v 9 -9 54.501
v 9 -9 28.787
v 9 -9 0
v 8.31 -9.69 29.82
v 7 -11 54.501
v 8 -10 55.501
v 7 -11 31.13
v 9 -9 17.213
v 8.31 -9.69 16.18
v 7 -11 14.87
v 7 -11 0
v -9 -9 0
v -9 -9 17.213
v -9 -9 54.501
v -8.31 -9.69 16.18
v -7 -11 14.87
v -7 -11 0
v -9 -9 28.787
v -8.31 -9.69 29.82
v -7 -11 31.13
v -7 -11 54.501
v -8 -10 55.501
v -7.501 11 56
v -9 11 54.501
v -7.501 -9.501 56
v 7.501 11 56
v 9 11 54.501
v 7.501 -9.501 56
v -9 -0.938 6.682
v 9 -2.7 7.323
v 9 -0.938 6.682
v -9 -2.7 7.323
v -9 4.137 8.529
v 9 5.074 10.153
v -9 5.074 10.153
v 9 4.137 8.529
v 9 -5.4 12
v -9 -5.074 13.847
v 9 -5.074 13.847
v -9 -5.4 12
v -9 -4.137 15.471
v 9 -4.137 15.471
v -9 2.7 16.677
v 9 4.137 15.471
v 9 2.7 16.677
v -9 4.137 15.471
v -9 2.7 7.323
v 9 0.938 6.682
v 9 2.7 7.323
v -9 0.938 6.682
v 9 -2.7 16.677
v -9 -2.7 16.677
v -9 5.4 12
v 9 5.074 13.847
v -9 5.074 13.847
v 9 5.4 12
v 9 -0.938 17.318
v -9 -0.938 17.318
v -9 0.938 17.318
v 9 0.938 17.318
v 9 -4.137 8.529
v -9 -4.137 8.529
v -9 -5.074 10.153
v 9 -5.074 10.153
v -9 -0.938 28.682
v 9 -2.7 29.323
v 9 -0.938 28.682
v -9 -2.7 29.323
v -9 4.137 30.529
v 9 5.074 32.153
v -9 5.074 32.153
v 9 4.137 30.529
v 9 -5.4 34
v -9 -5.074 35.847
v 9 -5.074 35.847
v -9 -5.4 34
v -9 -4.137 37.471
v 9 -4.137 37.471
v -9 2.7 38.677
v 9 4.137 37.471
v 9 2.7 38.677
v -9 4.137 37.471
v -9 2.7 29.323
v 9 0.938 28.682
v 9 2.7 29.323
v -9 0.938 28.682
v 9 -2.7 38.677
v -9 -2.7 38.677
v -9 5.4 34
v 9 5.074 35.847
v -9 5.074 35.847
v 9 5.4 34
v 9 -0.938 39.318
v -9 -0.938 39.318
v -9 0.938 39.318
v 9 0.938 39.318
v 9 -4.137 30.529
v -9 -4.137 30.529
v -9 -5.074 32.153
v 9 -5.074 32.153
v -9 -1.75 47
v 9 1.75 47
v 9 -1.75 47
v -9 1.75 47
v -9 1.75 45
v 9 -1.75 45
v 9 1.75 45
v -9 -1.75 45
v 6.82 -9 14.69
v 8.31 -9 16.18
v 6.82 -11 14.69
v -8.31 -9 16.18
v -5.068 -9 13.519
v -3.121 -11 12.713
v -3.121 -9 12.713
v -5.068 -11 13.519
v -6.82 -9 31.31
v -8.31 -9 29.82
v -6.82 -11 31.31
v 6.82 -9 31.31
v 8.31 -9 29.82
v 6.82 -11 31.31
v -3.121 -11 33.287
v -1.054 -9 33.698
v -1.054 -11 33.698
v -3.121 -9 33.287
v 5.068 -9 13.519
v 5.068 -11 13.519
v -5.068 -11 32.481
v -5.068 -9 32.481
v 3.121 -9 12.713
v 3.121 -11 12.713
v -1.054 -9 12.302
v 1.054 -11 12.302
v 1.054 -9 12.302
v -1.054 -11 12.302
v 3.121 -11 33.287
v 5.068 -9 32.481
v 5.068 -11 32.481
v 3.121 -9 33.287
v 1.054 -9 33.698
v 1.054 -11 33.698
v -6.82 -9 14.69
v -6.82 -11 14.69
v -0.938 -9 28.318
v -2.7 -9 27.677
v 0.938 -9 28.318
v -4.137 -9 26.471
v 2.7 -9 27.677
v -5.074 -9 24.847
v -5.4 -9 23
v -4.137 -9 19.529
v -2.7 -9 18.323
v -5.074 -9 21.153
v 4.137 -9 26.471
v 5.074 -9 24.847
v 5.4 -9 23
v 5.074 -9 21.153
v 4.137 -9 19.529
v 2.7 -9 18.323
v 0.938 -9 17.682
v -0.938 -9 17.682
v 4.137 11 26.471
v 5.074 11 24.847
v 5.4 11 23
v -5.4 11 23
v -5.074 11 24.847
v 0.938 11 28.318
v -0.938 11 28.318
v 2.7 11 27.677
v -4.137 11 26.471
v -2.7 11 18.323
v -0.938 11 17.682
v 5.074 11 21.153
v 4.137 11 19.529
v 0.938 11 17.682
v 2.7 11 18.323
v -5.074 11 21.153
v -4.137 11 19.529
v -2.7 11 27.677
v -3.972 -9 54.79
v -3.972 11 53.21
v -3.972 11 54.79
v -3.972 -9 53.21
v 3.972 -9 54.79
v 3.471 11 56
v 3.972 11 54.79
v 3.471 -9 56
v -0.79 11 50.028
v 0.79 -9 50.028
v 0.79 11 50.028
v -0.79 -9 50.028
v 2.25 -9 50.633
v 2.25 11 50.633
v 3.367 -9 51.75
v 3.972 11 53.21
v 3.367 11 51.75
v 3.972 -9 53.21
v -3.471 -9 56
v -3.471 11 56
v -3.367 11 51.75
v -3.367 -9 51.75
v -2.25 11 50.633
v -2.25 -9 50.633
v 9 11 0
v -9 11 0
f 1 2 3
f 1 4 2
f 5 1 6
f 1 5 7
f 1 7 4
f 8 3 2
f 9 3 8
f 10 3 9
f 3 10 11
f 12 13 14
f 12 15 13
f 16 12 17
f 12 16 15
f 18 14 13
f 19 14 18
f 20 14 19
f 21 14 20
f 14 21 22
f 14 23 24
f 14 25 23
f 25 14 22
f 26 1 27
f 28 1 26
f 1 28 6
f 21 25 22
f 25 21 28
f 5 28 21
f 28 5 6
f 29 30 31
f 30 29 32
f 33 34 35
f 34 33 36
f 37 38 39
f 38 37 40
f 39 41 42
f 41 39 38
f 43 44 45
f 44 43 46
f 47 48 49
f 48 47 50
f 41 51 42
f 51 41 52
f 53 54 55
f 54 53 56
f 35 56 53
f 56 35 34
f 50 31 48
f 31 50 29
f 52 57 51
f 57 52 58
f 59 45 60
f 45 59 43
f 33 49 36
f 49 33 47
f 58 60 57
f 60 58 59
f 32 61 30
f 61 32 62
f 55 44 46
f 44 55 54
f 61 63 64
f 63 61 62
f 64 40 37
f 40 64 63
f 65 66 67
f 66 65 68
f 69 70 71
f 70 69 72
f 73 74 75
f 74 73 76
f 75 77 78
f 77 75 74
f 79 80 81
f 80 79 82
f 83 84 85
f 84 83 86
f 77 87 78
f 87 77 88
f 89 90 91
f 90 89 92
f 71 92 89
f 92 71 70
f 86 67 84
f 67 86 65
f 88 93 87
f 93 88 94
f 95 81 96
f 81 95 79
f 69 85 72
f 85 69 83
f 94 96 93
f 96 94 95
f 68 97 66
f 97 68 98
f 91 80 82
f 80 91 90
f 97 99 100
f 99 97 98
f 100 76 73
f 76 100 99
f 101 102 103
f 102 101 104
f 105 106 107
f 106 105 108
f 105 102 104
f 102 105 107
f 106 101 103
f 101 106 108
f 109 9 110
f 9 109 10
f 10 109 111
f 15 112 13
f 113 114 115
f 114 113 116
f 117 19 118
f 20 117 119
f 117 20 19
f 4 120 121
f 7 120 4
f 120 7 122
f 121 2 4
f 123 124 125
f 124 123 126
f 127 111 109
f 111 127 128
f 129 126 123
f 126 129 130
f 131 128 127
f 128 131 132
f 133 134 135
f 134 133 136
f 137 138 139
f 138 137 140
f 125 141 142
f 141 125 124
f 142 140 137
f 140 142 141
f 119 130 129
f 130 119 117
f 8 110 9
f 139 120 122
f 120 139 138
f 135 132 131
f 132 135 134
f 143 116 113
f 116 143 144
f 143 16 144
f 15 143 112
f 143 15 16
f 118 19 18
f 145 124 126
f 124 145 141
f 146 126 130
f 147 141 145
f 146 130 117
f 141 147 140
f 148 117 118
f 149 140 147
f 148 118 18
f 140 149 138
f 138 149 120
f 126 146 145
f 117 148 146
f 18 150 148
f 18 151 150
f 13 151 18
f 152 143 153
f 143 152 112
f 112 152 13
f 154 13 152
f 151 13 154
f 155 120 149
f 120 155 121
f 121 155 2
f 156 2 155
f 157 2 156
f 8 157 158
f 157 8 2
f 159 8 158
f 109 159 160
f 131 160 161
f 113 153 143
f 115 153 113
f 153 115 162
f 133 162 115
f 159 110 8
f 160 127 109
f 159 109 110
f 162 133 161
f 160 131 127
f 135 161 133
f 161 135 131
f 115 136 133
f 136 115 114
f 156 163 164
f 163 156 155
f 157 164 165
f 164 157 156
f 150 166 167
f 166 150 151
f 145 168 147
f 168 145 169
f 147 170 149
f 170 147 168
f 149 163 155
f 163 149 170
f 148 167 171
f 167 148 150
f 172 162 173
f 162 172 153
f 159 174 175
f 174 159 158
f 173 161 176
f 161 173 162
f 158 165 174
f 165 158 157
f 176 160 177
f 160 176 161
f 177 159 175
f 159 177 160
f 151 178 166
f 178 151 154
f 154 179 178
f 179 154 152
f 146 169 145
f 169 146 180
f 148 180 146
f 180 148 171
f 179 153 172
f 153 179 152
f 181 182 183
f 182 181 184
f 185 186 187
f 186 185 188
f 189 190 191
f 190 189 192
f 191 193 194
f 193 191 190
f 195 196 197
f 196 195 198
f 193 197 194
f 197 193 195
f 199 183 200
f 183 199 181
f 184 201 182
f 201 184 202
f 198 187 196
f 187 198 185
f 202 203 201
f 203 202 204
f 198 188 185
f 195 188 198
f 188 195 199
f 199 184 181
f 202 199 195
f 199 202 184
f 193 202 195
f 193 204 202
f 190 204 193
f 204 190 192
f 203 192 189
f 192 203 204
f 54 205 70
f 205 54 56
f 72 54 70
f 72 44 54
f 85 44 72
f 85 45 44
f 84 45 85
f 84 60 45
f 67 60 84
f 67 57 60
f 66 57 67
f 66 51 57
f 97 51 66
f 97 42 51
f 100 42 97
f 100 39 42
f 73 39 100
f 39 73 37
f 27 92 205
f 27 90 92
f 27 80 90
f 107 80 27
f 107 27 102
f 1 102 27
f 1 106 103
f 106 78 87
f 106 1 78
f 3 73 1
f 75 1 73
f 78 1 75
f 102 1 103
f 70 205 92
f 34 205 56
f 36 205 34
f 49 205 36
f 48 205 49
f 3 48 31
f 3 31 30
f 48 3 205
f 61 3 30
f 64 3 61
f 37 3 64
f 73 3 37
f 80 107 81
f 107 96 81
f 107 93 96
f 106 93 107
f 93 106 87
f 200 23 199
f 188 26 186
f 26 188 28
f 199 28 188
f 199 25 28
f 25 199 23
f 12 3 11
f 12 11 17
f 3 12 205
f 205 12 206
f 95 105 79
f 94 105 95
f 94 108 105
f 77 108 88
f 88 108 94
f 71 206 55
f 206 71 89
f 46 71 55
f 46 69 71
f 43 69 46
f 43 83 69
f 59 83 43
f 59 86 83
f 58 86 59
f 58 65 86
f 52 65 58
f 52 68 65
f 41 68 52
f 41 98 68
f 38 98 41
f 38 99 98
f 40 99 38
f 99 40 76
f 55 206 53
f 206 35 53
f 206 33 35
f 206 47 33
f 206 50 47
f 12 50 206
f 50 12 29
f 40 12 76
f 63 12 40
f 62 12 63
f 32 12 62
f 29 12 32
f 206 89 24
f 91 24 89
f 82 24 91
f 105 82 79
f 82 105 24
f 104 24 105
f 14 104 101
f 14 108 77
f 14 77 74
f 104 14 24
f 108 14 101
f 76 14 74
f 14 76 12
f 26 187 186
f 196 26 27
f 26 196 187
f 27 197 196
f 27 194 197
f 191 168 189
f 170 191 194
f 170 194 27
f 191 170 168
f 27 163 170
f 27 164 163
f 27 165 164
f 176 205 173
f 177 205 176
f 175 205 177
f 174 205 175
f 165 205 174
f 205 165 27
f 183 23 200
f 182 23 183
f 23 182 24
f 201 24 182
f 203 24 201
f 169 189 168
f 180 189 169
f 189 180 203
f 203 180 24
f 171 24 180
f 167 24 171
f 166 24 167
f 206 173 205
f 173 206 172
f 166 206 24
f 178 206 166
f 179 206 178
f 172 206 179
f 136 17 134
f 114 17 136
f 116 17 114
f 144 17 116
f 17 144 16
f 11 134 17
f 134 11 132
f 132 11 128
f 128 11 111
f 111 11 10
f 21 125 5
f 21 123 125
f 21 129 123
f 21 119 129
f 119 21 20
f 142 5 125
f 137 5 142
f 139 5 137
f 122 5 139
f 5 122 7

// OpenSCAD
  ///////////////////
 // CONFIGURATION //
///////////////////

// OVERALL DIMENSIONS OF THE CORNER
corner_width=18;
corner_length=22;
corner_height=56;

// DIMENSIONS OF DRILL HOLES FOR THREADED RODS
threaded_rod_diameter=10.8;
threaded_rod_fn=18;

// DIMENSIONS OF CUTOUTS FOR WHASHERS
whasher_diameter=21.5;
whasher_height=2;
whasher_fn=32;

// DIMENSIONS OF MOUNT FOR SMOOTH RODS
smooth_rod_diameter=8.1;
smooth_rod_fn=16;
smooth_rod_depth=20;

// POSITIONING OF ALL RODS
lower_x_threaded_rod_z=12;
upper_x_threaded_rod_z=34;
y_threaded_rod_z=23;
y_smooth_rod_z=54;

// DIMENSION AND POSITION OF CUTOUT FOR CABLE TIE
cable_tie_height=2;
cable_tie_width=3.5;
cable_tie_z=46;

// FANCY CORNER CONFIGURATION
outer_corner_cut=2*sqrt(whasher_height);
top_corner_cut=2.12;

  ///////////
 // MAGIC //
///////////

module vanilla_corner(){
	translate([0,0,28])
		import("Y-CORNERS.stl");
}

module x_rods(){
	union(){
		// LOWER THREADED ROD
		translate([0,0,lower_x_threaded_rod_z])
			rotate([0,90,0])
				rotate([0,0,360/threaded_rod_fn/2])
					cylinder(r=threaded_rod_diameter/2, h=2*corner_width,center=true,$fn=threaded_rod_fn);
		// UPPER THREADED ROD
		translate([0,0,upper_x_threaded_rod_z])
			rotate([0,90,0])
				rotate([0,0,360/threaded_rod_fn/2])
					cylinder(r=threaded_rod_diameter/2, h=2*corner_width,center=true,$fn=threaded_rod_fn);
		// CABLE TIE
		translate([0,0,cable_tie_z])
			cube([2*corner_width,cable_tie_width,cable_tie_height],center=true);
	}
}

module y_rods(){
	union(){
		// WHASHER
		translate([0,-corner_length/2,y_threaded_rod_z])
			rotate([90,0,0])
				rotate([0,0,360/whasher_fn/2])
					cylinder(r=whasher_diameter/2, h=2*whasher_height,center=true,$fn=whasher_fn);
		// THREADED ROD
		translate([0,0,y_threaded_rod_z])
			rotate([90,0,0])
				rotate([0,0,0])
					cylinder(r=threaded_rod_diameter/2, h=2*corner_length,center=true,$fn=threaded_rod_fn);
		// SMOOTH ROD
		translate([0,corner_length/2,y_smooth_rod_z])
			rotate([90,0,0])
				rotate([0,0,360/smooth_rod_fn/2])
					cylinder(r=smooth_rod_diameter/2, h=2*smooth_rod_depth,center=true,$fn=smooth_rod_fn);
	}
}

module block(){
	translate([0,0,corner_height/2])
		cube([corner_width,corner_length,corner_height],center=true);
}

module fancy_corners(){
	union(){
		/*
		// INNER
		translate([corner_width/2,corner_length/2,corner_height/2])
			rotate([0,0,45])
				cube([inner_corner_cut,2*inner_corner_cut,2*corner_height],center=true);
		translate([-corner_width/2,corner_length/2,corner_height/2])
			rotate([0,0,-45])
				cube([inner_corner_cut,2*inner_corner_cut,2*corner_height],center=true);
		*/
		// OUTER
		translate([corner_width/2,-corner_length/2,corner_height/2])
			rotate([0,0,-45])
				cube([outer_corner_cut,2*outer_corner_cut,2*corner_height],center=true);
		translate([-corner_width/2,-corner_length/2,corner_height/2])
			rotate([0,0,45])
				cube([outer_corner_cut,2*outer_corner_cut,2*corner_height],center=true);
		// UPPER
		translate([-corner_width/2,0,corner_height])
			rotate([0,-45,0])
				cube([2*top_corner_cut,2*corner_length,top_corner_cut],center=true);
		translate([corner_width/2,0,corner_height])
			rotate([0,45,0])
				cube([2*top_corner_cut,2*corner_length,top_corner_cut],center=true);
		translate([0,-corner_length/2,corner_height])
			rotate([45,0,0])
				cube([2*corner_width,2*top_corner_cut,top_corner_cut],center=true);
	}
}

module corner(){
	difference(){
		block();
		fancy_corners();
		x_rods();
		y_rods();
	}
}

corner();
